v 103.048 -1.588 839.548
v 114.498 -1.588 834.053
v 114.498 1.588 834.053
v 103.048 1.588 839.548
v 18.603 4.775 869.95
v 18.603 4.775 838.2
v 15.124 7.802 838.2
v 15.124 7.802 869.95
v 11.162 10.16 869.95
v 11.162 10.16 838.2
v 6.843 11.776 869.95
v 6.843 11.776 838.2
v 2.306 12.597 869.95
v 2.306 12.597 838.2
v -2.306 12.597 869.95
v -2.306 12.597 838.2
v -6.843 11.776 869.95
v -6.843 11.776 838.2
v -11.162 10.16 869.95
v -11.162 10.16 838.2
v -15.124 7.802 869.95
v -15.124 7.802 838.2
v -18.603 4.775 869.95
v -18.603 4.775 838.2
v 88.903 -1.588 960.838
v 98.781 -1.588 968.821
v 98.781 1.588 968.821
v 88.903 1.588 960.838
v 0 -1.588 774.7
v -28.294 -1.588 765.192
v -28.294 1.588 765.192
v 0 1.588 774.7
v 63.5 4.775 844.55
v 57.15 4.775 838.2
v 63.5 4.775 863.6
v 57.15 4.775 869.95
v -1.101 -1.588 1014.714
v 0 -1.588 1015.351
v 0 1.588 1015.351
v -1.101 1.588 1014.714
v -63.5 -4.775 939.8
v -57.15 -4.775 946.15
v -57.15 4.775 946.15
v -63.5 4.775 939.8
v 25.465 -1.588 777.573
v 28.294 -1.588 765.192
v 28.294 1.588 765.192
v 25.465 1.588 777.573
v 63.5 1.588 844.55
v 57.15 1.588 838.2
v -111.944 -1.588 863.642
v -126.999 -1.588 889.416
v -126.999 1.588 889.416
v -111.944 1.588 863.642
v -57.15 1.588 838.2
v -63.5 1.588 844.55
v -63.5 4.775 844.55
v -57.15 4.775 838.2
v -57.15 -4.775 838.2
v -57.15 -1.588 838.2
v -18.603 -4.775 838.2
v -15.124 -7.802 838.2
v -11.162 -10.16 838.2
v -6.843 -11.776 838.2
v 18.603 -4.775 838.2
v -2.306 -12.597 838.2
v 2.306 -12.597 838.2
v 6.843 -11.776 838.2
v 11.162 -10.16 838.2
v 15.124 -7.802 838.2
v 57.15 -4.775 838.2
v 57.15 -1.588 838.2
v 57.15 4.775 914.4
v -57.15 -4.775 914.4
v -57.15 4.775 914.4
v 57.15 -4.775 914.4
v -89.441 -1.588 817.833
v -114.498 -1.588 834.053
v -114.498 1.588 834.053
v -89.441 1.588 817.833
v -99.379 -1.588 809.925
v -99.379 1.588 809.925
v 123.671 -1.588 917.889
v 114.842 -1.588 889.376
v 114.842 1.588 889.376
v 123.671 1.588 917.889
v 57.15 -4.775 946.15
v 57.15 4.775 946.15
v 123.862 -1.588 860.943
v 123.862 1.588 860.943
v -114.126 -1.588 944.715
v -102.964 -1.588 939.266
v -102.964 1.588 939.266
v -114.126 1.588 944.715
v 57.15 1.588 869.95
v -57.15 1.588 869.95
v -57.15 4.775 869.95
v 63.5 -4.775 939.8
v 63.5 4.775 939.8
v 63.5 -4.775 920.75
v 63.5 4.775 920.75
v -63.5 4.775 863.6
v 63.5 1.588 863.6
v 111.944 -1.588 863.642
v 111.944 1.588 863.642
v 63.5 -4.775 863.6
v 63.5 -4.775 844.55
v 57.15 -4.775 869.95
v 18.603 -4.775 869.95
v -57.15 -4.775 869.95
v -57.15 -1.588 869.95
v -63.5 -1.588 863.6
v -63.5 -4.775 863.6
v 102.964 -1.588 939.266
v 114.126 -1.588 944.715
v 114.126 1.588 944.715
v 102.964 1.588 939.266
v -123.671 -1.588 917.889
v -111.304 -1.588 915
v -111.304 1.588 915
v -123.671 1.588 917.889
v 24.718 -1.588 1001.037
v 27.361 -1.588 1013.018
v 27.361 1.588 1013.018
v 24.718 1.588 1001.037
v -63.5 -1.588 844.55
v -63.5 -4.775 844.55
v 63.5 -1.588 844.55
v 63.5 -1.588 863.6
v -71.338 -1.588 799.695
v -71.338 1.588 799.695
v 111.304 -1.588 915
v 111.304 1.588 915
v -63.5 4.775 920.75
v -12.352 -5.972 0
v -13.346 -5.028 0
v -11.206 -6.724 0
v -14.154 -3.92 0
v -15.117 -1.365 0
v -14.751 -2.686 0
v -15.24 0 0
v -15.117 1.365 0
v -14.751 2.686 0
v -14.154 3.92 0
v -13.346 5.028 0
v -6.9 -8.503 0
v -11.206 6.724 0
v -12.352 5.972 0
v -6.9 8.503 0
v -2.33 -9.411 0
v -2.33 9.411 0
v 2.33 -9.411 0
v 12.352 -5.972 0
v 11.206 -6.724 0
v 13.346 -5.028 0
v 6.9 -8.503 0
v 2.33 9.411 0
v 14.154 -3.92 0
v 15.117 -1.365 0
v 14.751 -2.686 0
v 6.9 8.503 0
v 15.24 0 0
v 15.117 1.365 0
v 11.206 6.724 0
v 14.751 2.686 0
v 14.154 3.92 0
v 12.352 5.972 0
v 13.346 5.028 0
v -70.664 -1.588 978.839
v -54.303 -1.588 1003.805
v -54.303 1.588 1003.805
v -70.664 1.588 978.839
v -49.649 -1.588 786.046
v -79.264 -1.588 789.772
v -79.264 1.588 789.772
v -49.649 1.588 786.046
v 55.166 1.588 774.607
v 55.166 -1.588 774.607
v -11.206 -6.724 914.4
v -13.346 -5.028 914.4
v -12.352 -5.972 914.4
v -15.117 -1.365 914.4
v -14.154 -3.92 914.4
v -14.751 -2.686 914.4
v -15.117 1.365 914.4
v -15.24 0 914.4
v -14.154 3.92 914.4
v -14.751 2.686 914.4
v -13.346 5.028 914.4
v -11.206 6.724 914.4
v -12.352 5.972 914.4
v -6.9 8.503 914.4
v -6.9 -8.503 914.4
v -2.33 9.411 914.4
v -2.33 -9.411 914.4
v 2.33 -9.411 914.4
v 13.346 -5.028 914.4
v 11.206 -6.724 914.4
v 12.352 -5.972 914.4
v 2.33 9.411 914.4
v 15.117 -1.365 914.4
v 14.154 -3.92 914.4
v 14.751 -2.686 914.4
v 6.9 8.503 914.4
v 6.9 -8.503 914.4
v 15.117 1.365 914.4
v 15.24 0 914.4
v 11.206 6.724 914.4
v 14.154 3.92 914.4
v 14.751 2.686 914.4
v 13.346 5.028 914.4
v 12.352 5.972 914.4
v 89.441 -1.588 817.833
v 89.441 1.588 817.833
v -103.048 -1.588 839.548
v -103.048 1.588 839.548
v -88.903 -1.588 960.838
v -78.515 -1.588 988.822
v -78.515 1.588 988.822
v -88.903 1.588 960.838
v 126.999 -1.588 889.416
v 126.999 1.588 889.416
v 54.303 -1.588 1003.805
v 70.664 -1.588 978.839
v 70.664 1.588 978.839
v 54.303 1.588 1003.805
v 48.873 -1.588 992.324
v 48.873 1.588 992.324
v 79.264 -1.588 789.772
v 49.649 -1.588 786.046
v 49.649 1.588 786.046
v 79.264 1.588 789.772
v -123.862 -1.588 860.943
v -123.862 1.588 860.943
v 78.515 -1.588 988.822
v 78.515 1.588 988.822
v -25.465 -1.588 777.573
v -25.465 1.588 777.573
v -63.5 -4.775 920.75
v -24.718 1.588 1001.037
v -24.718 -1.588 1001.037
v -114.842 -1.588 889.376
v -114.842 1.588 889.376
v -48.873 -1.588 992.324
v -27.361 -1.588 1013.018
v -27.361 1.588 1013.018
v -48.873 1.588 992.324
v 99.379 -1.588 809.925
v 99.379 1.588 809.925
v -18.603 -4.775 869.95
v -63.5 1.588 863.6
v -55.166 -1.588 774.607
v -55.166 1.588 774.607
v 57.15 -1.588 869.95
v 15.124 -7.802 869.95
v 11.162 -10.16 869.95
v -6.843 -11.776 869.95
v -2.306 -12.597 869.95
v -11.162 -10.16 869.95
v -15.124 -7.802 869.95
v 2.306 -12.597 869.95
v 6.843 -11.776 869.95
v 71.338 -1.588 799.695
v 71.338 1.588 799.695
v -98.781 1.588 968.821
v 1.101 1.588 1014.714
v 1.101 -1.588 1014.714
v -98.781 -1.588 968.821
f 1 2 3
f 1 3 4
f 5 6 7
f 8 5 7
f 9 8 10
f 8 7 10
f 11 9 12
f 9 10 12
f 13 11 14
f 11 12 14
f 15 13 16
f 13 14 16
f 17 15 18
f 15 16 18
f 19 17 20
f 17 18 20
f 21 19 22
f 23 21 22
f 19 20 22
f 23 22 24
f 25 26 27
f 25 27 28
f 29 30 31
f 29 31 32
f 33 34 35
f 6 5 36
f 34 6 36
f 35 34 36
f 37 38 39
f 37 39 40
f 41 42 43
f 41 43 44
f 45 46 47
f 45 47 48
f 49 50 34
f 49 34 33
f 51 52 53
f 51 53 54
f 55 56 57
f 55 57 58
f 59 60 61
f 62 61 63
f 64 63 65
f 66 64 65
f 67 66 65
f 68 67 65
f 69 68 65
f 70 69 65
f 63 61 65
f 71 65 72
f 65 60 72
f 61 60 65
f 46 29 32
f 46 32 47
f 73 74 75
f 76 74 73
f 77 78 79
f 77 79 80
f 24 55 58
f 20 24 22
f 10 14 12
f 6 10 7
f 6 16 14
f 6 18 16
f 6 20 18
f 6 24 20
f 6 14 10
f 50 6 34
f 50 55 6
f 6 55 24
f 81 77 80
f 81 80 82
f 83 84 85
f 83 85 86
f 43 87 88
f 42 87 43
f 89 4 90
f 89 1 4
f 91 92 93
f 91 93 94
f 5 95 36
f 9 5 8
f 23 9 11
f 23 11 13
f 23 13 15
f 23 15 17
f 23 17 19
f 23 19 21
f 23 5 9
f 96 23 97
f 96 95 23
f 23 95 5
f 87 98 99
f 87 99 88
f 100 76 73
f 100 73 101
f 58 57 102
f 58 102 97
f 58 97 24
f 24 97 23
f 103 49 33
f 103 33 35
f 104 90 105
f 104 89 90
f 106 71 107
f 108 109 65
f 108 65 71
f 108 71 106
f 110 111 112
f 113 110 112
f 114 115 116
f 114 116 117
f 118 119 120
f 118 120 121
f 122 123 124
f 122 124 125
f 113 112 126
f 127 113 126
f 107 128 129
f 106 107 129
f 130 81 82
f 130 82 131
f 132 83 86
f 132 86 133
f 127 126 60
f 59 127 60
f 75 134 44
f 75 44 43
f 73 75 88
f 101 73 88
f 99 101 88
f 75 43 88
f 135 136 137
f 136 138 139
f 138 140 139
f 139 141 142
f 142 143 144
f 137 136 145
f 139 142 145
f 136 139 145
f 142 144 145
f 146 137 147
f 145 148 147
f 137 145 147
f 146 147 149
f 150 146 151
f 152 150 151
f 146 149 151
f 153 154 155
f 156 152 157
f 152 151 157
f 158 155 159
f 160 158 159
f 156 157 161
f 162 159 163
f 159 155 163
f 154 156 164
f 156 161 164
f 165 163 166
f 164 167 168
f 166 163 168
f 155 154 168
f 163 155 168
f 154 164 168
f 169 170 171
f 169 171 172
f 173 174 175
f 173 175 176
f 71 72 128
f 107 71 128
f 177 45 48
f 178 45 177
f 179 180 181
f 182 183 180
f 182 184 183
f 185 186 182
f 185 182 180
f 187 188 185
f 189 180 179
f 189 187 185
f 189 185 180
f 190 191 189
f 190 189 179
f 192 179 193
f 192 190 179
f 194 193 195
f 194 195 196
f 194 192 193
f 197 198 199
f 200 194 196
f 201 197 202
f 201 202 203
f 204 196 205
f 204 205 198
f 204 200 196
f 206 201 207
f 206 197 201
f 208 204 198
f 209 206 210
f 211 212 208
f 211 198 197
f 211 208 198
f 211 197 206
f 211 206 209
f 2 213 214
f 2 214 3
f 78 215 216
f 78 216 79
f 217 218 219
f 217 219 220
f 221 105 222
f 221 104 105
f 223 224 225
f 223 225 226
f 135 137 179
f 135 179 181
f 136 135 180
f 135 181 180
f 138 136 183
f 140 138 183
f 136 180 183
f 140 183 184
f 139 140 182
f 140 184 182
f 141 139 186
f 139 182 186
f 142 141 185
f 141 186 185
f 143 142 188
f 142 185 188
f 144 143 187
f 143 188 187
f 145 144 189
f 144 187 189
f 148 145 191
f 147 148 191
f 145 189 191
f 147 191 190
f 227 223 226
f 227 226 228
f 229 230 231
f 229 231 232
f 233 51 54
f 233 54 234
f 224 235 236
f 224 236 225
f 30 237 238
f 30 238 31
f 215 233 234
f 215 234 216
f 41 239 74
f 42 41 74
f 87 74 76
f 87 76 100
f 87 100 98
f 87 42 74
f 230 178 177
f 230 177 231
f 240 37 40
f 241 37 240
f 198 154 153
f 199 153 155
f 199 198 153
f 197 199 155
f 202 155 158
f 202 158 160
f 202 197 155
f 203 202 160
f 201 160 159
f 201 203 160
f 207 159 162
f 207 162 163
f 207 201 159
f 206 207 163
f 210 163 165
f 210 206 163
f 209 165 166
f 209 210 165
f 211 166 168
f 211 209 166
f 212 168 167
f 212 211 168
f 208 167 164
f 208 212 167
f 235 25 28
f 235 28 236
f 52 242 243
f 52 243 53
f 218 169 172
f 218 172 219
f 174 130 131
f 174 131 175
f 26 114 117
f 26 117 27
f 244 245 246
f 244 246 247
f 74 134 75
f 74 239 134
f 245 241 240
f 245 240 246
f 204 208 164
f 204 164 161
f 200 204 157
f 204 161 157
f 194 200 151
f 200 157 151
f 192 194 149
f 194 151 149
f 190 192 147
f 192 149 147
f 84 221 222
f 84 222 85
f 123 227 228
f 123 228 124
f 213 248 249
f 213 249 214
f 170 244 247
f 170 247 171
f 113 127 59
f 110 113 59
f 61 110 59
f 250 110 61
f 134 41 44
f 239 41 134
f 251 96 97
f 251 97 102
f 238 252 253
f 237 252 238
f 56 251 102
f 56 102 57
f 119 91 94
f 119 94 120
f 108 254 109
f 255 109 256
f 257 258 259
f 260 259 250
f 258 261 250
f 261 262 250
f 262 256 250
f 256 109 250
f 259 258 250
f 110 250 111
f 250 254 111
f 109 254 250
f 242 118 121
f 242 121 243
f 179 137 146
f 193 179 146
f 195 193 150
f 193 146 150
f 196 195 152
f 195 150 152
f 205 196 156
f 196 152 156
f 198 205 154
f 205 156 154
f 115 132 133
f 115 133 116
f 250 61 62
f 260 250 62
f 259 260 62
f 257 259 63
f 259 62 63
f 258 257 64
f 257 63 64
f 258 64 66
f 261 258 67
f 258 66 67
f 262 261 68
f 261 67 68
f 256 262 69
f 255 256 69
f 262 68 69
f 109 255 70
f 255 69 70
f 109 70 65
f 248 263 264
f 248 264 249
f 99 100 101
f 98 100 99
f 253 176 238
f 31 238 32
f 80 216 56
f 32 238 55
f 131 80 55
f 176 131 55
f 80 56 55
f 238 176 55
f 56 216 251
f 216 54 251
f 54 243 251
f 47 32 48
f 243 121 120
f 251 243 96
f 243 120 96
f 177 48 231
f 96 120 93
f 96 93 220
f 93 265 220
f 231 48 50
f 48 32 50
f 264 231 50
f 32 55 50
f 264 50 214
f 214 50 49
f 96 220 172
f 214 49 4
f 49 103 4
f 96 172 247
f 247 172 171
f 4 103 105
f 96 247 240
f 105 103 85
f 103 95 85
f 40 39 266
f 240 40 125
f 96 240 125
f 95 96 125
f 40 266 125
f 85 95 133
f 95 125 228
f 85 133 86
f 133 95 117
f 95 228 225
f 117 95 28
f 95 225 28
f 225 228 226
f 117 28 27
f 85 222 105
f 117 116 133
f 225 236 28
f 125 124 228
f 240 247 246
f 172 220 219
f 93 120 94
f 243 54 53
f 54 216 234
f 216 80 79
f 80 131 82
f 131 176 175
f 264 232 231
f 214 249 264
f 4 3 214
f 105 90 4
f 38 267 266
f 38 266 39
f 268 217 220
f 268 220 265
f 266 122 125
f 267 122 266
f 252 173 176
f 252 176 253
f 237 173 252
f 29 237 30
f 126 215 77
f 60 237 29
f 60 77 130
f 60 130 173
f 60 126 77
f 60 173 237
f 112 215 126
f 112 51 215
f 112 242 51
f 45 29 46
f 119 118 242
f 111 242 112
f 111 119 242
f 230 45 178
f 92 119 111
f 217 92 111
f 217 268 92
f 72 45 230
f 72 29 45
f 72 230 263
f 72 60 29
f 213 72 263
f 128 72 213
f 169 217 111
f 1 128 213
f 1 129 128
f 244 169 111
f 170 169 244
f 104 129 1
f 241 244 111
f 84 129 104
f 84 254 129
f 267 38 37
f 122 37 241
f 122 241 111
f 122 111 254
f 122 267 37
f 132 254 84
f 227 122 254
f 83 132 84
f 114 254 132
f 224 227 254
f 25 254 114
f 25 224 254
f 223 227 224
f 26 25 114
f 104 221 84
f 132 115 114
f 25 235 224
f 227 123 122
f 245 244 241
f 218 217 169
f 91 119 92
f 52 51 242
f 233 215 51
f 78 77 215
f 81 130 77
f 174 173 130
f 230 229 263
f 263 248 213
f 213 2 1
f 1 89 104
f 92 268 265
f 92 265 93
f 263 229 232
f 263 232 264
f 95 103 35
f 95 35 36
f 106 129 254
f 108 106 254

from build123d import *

# Parameters (mm, degrees)
F1_DEPTH      = 914.4
F3_DEPTH      = 1.5875
F3_DEPTH_BACK = 1.5875
F5_DEPTH      = 4.7752
F5_DEPTH_BACK = 4.7752
F7_DEPTH      = 4.7752
F7_DEPTH_BACK = 4.7752
F9_START      = 838.2
F9_DEPTH      = 31.75
F10_R         = 7.62


with BuildPart() as f1:
    # F0 (on Top) → F1 (new body)
    with BuildSketch(Plane.XY):
        with BuildLine():
            ThreePointArc((-19.05, 0), (0, -9.525), (19.05, 0))
            ThreePointArc((19.05, 0), (0, 9.525), (-19.05, 0))
        make_face()
    extrude(amount=F1_DEPTH)

    # F10
    f10_edges = [f1.edges().sort_by_distance(p)[0] for p in [
        (19.05, 0, 457.2),
        (-19.05, 0, 457.2),
    ]]
    fillet(f10_edges, radius=F10_R)


with BuildPart() as f3:
    # F2 (on Front) → F3 (new body, two sides)
    with BuildSketch(Plane.XZ) as f3_sk:
        Polygon((111.9438048034, 863.6422354789), (126.9993189541, 889.4159148914), (114.8417657116, 889.3760996587), (123.6705603008, 917.8893148914), (111.3035042707, 915.0003834023), (114.1262108525, 944.7154197367), (102.9643832521, 939.2663129528), (98.7810034847, 968.8205070803), (88.9029031363, 960.8384563722), (78.515398819, 988.8215014328), (70.6638589371, 978.8393512895), (54.3031673817, 1003.8049041301), (48.8728506435, 992.3244137171), (27.361352482, 1013.0175648461), (24.7180633611, 1001.0366410167), (1.1008259294, 1014.7136328074), (0, 1015.351132737), (-1.1008259294, 1014.7136328074), (-24.7180633611, 1001.0366410167), (-27.361352482, 1013.0175648461), (-48.8728506435, 992.3244137171), (-54.3031673817, 1003.8049041301), (-70.6638589371, 978.8393512895), (-78.515398819, 988.8215014328), (-88.9029031363, 960.8384563722), (-98.7810034847, 968.8205070803), (-102.9643832521, 939.2663129528), (-114.1262108525, 944.7154197367), (-111.3035042707, 915.0003834023), (-123.6705603008, 917.8893148914), (-114.8417657116, 889.3760996587), (-126.9993189541, 889.4159148914), (-111.9438048034, 863.6422354789), (-123.8619292978, 860.9425148914), (-103.0482818511, 839.5475823894), (-114.4980909457, 834.0528693216), (-89.441039496, 817.8326587972), (-99.3789327734, 809.9251764414), (-71.3379860484, 799.6950071577), (-79.2644289427, 789.7722301753), (-49.6490830757, 786.0463281386), (-55.1656478619, 774.6070312651), (-25.4645371669, 777.572681326), (-28.2939301854, 765.19186814), (0, 774.7), (28.2939301854, 765.19186814), (25.4645371669, 777.572681326), (55.1656478619, 774.6070312651), (49.6490830757, 786.0463281386), (79.2644289427, 789.7722301753), (71.3379860484, 799.6950071577), (99.3789327734, 809.9251764414), (89.441039496, 817.8326587972), (114.4980909457, 834.0528693216), (103.0482818511, 839.5475823894), (123.8619292978, 860.9425148914), align=None)
    extrude(amount=F3_DEPTH)
    extrude(f3_sk.sketch, amount=-F3_DEPTH_BACK)

    # F6 (on Front) → F7 (join, two sides)
    with BuildSketch(Plane.XZ) as f7_sk:
        Polygon((-57.15, 838.2), (57.15, 838.2), (63.5, 844.55), (63.5, 863.6), (57.15, 869.95), (-57.15, 869.95), (-63.5, 863.6), (-63.5, 844.55), align=None)
    extrude(amount=F7_DEPTH)
    extrude(f7_sk.sketch, amount=-F7_DEPTH_BACK)

    # F8 (on Top) → F9 (join)
    with BuildSketch(Plane.XY.offset(F9_START)):
        with BuildLine():
            ThreePointArc((-22.225, 0), (0, -12.7), (22.225, 0))
            ThreePointArc((22.225, 0), (0, 12.7), (-22.225, 0))
        make_face()
    extrude(amount=F9_DEPTH)


with BuildPart() as f5:
    # F4 (on Front) → F5 (new body, two sides)
    with BuildSketch(Plane.XZ) as f5_sk:
        Polygon((-57.15, 914.4), (57.15, 914.4), (63.5, 920.75), (63.5, 939.8), (57.15, 946.15), (-57.15, 946.15), (-63.5, 939.8), (-63.5, 920.75), align=None)
    extrude(amount=F5_DEPTH)
    extrude(f5_sk.sketch, amount=-F5_DEPTH_BACK)


solid = Compound([f1.part, f3.part, f5.part])
